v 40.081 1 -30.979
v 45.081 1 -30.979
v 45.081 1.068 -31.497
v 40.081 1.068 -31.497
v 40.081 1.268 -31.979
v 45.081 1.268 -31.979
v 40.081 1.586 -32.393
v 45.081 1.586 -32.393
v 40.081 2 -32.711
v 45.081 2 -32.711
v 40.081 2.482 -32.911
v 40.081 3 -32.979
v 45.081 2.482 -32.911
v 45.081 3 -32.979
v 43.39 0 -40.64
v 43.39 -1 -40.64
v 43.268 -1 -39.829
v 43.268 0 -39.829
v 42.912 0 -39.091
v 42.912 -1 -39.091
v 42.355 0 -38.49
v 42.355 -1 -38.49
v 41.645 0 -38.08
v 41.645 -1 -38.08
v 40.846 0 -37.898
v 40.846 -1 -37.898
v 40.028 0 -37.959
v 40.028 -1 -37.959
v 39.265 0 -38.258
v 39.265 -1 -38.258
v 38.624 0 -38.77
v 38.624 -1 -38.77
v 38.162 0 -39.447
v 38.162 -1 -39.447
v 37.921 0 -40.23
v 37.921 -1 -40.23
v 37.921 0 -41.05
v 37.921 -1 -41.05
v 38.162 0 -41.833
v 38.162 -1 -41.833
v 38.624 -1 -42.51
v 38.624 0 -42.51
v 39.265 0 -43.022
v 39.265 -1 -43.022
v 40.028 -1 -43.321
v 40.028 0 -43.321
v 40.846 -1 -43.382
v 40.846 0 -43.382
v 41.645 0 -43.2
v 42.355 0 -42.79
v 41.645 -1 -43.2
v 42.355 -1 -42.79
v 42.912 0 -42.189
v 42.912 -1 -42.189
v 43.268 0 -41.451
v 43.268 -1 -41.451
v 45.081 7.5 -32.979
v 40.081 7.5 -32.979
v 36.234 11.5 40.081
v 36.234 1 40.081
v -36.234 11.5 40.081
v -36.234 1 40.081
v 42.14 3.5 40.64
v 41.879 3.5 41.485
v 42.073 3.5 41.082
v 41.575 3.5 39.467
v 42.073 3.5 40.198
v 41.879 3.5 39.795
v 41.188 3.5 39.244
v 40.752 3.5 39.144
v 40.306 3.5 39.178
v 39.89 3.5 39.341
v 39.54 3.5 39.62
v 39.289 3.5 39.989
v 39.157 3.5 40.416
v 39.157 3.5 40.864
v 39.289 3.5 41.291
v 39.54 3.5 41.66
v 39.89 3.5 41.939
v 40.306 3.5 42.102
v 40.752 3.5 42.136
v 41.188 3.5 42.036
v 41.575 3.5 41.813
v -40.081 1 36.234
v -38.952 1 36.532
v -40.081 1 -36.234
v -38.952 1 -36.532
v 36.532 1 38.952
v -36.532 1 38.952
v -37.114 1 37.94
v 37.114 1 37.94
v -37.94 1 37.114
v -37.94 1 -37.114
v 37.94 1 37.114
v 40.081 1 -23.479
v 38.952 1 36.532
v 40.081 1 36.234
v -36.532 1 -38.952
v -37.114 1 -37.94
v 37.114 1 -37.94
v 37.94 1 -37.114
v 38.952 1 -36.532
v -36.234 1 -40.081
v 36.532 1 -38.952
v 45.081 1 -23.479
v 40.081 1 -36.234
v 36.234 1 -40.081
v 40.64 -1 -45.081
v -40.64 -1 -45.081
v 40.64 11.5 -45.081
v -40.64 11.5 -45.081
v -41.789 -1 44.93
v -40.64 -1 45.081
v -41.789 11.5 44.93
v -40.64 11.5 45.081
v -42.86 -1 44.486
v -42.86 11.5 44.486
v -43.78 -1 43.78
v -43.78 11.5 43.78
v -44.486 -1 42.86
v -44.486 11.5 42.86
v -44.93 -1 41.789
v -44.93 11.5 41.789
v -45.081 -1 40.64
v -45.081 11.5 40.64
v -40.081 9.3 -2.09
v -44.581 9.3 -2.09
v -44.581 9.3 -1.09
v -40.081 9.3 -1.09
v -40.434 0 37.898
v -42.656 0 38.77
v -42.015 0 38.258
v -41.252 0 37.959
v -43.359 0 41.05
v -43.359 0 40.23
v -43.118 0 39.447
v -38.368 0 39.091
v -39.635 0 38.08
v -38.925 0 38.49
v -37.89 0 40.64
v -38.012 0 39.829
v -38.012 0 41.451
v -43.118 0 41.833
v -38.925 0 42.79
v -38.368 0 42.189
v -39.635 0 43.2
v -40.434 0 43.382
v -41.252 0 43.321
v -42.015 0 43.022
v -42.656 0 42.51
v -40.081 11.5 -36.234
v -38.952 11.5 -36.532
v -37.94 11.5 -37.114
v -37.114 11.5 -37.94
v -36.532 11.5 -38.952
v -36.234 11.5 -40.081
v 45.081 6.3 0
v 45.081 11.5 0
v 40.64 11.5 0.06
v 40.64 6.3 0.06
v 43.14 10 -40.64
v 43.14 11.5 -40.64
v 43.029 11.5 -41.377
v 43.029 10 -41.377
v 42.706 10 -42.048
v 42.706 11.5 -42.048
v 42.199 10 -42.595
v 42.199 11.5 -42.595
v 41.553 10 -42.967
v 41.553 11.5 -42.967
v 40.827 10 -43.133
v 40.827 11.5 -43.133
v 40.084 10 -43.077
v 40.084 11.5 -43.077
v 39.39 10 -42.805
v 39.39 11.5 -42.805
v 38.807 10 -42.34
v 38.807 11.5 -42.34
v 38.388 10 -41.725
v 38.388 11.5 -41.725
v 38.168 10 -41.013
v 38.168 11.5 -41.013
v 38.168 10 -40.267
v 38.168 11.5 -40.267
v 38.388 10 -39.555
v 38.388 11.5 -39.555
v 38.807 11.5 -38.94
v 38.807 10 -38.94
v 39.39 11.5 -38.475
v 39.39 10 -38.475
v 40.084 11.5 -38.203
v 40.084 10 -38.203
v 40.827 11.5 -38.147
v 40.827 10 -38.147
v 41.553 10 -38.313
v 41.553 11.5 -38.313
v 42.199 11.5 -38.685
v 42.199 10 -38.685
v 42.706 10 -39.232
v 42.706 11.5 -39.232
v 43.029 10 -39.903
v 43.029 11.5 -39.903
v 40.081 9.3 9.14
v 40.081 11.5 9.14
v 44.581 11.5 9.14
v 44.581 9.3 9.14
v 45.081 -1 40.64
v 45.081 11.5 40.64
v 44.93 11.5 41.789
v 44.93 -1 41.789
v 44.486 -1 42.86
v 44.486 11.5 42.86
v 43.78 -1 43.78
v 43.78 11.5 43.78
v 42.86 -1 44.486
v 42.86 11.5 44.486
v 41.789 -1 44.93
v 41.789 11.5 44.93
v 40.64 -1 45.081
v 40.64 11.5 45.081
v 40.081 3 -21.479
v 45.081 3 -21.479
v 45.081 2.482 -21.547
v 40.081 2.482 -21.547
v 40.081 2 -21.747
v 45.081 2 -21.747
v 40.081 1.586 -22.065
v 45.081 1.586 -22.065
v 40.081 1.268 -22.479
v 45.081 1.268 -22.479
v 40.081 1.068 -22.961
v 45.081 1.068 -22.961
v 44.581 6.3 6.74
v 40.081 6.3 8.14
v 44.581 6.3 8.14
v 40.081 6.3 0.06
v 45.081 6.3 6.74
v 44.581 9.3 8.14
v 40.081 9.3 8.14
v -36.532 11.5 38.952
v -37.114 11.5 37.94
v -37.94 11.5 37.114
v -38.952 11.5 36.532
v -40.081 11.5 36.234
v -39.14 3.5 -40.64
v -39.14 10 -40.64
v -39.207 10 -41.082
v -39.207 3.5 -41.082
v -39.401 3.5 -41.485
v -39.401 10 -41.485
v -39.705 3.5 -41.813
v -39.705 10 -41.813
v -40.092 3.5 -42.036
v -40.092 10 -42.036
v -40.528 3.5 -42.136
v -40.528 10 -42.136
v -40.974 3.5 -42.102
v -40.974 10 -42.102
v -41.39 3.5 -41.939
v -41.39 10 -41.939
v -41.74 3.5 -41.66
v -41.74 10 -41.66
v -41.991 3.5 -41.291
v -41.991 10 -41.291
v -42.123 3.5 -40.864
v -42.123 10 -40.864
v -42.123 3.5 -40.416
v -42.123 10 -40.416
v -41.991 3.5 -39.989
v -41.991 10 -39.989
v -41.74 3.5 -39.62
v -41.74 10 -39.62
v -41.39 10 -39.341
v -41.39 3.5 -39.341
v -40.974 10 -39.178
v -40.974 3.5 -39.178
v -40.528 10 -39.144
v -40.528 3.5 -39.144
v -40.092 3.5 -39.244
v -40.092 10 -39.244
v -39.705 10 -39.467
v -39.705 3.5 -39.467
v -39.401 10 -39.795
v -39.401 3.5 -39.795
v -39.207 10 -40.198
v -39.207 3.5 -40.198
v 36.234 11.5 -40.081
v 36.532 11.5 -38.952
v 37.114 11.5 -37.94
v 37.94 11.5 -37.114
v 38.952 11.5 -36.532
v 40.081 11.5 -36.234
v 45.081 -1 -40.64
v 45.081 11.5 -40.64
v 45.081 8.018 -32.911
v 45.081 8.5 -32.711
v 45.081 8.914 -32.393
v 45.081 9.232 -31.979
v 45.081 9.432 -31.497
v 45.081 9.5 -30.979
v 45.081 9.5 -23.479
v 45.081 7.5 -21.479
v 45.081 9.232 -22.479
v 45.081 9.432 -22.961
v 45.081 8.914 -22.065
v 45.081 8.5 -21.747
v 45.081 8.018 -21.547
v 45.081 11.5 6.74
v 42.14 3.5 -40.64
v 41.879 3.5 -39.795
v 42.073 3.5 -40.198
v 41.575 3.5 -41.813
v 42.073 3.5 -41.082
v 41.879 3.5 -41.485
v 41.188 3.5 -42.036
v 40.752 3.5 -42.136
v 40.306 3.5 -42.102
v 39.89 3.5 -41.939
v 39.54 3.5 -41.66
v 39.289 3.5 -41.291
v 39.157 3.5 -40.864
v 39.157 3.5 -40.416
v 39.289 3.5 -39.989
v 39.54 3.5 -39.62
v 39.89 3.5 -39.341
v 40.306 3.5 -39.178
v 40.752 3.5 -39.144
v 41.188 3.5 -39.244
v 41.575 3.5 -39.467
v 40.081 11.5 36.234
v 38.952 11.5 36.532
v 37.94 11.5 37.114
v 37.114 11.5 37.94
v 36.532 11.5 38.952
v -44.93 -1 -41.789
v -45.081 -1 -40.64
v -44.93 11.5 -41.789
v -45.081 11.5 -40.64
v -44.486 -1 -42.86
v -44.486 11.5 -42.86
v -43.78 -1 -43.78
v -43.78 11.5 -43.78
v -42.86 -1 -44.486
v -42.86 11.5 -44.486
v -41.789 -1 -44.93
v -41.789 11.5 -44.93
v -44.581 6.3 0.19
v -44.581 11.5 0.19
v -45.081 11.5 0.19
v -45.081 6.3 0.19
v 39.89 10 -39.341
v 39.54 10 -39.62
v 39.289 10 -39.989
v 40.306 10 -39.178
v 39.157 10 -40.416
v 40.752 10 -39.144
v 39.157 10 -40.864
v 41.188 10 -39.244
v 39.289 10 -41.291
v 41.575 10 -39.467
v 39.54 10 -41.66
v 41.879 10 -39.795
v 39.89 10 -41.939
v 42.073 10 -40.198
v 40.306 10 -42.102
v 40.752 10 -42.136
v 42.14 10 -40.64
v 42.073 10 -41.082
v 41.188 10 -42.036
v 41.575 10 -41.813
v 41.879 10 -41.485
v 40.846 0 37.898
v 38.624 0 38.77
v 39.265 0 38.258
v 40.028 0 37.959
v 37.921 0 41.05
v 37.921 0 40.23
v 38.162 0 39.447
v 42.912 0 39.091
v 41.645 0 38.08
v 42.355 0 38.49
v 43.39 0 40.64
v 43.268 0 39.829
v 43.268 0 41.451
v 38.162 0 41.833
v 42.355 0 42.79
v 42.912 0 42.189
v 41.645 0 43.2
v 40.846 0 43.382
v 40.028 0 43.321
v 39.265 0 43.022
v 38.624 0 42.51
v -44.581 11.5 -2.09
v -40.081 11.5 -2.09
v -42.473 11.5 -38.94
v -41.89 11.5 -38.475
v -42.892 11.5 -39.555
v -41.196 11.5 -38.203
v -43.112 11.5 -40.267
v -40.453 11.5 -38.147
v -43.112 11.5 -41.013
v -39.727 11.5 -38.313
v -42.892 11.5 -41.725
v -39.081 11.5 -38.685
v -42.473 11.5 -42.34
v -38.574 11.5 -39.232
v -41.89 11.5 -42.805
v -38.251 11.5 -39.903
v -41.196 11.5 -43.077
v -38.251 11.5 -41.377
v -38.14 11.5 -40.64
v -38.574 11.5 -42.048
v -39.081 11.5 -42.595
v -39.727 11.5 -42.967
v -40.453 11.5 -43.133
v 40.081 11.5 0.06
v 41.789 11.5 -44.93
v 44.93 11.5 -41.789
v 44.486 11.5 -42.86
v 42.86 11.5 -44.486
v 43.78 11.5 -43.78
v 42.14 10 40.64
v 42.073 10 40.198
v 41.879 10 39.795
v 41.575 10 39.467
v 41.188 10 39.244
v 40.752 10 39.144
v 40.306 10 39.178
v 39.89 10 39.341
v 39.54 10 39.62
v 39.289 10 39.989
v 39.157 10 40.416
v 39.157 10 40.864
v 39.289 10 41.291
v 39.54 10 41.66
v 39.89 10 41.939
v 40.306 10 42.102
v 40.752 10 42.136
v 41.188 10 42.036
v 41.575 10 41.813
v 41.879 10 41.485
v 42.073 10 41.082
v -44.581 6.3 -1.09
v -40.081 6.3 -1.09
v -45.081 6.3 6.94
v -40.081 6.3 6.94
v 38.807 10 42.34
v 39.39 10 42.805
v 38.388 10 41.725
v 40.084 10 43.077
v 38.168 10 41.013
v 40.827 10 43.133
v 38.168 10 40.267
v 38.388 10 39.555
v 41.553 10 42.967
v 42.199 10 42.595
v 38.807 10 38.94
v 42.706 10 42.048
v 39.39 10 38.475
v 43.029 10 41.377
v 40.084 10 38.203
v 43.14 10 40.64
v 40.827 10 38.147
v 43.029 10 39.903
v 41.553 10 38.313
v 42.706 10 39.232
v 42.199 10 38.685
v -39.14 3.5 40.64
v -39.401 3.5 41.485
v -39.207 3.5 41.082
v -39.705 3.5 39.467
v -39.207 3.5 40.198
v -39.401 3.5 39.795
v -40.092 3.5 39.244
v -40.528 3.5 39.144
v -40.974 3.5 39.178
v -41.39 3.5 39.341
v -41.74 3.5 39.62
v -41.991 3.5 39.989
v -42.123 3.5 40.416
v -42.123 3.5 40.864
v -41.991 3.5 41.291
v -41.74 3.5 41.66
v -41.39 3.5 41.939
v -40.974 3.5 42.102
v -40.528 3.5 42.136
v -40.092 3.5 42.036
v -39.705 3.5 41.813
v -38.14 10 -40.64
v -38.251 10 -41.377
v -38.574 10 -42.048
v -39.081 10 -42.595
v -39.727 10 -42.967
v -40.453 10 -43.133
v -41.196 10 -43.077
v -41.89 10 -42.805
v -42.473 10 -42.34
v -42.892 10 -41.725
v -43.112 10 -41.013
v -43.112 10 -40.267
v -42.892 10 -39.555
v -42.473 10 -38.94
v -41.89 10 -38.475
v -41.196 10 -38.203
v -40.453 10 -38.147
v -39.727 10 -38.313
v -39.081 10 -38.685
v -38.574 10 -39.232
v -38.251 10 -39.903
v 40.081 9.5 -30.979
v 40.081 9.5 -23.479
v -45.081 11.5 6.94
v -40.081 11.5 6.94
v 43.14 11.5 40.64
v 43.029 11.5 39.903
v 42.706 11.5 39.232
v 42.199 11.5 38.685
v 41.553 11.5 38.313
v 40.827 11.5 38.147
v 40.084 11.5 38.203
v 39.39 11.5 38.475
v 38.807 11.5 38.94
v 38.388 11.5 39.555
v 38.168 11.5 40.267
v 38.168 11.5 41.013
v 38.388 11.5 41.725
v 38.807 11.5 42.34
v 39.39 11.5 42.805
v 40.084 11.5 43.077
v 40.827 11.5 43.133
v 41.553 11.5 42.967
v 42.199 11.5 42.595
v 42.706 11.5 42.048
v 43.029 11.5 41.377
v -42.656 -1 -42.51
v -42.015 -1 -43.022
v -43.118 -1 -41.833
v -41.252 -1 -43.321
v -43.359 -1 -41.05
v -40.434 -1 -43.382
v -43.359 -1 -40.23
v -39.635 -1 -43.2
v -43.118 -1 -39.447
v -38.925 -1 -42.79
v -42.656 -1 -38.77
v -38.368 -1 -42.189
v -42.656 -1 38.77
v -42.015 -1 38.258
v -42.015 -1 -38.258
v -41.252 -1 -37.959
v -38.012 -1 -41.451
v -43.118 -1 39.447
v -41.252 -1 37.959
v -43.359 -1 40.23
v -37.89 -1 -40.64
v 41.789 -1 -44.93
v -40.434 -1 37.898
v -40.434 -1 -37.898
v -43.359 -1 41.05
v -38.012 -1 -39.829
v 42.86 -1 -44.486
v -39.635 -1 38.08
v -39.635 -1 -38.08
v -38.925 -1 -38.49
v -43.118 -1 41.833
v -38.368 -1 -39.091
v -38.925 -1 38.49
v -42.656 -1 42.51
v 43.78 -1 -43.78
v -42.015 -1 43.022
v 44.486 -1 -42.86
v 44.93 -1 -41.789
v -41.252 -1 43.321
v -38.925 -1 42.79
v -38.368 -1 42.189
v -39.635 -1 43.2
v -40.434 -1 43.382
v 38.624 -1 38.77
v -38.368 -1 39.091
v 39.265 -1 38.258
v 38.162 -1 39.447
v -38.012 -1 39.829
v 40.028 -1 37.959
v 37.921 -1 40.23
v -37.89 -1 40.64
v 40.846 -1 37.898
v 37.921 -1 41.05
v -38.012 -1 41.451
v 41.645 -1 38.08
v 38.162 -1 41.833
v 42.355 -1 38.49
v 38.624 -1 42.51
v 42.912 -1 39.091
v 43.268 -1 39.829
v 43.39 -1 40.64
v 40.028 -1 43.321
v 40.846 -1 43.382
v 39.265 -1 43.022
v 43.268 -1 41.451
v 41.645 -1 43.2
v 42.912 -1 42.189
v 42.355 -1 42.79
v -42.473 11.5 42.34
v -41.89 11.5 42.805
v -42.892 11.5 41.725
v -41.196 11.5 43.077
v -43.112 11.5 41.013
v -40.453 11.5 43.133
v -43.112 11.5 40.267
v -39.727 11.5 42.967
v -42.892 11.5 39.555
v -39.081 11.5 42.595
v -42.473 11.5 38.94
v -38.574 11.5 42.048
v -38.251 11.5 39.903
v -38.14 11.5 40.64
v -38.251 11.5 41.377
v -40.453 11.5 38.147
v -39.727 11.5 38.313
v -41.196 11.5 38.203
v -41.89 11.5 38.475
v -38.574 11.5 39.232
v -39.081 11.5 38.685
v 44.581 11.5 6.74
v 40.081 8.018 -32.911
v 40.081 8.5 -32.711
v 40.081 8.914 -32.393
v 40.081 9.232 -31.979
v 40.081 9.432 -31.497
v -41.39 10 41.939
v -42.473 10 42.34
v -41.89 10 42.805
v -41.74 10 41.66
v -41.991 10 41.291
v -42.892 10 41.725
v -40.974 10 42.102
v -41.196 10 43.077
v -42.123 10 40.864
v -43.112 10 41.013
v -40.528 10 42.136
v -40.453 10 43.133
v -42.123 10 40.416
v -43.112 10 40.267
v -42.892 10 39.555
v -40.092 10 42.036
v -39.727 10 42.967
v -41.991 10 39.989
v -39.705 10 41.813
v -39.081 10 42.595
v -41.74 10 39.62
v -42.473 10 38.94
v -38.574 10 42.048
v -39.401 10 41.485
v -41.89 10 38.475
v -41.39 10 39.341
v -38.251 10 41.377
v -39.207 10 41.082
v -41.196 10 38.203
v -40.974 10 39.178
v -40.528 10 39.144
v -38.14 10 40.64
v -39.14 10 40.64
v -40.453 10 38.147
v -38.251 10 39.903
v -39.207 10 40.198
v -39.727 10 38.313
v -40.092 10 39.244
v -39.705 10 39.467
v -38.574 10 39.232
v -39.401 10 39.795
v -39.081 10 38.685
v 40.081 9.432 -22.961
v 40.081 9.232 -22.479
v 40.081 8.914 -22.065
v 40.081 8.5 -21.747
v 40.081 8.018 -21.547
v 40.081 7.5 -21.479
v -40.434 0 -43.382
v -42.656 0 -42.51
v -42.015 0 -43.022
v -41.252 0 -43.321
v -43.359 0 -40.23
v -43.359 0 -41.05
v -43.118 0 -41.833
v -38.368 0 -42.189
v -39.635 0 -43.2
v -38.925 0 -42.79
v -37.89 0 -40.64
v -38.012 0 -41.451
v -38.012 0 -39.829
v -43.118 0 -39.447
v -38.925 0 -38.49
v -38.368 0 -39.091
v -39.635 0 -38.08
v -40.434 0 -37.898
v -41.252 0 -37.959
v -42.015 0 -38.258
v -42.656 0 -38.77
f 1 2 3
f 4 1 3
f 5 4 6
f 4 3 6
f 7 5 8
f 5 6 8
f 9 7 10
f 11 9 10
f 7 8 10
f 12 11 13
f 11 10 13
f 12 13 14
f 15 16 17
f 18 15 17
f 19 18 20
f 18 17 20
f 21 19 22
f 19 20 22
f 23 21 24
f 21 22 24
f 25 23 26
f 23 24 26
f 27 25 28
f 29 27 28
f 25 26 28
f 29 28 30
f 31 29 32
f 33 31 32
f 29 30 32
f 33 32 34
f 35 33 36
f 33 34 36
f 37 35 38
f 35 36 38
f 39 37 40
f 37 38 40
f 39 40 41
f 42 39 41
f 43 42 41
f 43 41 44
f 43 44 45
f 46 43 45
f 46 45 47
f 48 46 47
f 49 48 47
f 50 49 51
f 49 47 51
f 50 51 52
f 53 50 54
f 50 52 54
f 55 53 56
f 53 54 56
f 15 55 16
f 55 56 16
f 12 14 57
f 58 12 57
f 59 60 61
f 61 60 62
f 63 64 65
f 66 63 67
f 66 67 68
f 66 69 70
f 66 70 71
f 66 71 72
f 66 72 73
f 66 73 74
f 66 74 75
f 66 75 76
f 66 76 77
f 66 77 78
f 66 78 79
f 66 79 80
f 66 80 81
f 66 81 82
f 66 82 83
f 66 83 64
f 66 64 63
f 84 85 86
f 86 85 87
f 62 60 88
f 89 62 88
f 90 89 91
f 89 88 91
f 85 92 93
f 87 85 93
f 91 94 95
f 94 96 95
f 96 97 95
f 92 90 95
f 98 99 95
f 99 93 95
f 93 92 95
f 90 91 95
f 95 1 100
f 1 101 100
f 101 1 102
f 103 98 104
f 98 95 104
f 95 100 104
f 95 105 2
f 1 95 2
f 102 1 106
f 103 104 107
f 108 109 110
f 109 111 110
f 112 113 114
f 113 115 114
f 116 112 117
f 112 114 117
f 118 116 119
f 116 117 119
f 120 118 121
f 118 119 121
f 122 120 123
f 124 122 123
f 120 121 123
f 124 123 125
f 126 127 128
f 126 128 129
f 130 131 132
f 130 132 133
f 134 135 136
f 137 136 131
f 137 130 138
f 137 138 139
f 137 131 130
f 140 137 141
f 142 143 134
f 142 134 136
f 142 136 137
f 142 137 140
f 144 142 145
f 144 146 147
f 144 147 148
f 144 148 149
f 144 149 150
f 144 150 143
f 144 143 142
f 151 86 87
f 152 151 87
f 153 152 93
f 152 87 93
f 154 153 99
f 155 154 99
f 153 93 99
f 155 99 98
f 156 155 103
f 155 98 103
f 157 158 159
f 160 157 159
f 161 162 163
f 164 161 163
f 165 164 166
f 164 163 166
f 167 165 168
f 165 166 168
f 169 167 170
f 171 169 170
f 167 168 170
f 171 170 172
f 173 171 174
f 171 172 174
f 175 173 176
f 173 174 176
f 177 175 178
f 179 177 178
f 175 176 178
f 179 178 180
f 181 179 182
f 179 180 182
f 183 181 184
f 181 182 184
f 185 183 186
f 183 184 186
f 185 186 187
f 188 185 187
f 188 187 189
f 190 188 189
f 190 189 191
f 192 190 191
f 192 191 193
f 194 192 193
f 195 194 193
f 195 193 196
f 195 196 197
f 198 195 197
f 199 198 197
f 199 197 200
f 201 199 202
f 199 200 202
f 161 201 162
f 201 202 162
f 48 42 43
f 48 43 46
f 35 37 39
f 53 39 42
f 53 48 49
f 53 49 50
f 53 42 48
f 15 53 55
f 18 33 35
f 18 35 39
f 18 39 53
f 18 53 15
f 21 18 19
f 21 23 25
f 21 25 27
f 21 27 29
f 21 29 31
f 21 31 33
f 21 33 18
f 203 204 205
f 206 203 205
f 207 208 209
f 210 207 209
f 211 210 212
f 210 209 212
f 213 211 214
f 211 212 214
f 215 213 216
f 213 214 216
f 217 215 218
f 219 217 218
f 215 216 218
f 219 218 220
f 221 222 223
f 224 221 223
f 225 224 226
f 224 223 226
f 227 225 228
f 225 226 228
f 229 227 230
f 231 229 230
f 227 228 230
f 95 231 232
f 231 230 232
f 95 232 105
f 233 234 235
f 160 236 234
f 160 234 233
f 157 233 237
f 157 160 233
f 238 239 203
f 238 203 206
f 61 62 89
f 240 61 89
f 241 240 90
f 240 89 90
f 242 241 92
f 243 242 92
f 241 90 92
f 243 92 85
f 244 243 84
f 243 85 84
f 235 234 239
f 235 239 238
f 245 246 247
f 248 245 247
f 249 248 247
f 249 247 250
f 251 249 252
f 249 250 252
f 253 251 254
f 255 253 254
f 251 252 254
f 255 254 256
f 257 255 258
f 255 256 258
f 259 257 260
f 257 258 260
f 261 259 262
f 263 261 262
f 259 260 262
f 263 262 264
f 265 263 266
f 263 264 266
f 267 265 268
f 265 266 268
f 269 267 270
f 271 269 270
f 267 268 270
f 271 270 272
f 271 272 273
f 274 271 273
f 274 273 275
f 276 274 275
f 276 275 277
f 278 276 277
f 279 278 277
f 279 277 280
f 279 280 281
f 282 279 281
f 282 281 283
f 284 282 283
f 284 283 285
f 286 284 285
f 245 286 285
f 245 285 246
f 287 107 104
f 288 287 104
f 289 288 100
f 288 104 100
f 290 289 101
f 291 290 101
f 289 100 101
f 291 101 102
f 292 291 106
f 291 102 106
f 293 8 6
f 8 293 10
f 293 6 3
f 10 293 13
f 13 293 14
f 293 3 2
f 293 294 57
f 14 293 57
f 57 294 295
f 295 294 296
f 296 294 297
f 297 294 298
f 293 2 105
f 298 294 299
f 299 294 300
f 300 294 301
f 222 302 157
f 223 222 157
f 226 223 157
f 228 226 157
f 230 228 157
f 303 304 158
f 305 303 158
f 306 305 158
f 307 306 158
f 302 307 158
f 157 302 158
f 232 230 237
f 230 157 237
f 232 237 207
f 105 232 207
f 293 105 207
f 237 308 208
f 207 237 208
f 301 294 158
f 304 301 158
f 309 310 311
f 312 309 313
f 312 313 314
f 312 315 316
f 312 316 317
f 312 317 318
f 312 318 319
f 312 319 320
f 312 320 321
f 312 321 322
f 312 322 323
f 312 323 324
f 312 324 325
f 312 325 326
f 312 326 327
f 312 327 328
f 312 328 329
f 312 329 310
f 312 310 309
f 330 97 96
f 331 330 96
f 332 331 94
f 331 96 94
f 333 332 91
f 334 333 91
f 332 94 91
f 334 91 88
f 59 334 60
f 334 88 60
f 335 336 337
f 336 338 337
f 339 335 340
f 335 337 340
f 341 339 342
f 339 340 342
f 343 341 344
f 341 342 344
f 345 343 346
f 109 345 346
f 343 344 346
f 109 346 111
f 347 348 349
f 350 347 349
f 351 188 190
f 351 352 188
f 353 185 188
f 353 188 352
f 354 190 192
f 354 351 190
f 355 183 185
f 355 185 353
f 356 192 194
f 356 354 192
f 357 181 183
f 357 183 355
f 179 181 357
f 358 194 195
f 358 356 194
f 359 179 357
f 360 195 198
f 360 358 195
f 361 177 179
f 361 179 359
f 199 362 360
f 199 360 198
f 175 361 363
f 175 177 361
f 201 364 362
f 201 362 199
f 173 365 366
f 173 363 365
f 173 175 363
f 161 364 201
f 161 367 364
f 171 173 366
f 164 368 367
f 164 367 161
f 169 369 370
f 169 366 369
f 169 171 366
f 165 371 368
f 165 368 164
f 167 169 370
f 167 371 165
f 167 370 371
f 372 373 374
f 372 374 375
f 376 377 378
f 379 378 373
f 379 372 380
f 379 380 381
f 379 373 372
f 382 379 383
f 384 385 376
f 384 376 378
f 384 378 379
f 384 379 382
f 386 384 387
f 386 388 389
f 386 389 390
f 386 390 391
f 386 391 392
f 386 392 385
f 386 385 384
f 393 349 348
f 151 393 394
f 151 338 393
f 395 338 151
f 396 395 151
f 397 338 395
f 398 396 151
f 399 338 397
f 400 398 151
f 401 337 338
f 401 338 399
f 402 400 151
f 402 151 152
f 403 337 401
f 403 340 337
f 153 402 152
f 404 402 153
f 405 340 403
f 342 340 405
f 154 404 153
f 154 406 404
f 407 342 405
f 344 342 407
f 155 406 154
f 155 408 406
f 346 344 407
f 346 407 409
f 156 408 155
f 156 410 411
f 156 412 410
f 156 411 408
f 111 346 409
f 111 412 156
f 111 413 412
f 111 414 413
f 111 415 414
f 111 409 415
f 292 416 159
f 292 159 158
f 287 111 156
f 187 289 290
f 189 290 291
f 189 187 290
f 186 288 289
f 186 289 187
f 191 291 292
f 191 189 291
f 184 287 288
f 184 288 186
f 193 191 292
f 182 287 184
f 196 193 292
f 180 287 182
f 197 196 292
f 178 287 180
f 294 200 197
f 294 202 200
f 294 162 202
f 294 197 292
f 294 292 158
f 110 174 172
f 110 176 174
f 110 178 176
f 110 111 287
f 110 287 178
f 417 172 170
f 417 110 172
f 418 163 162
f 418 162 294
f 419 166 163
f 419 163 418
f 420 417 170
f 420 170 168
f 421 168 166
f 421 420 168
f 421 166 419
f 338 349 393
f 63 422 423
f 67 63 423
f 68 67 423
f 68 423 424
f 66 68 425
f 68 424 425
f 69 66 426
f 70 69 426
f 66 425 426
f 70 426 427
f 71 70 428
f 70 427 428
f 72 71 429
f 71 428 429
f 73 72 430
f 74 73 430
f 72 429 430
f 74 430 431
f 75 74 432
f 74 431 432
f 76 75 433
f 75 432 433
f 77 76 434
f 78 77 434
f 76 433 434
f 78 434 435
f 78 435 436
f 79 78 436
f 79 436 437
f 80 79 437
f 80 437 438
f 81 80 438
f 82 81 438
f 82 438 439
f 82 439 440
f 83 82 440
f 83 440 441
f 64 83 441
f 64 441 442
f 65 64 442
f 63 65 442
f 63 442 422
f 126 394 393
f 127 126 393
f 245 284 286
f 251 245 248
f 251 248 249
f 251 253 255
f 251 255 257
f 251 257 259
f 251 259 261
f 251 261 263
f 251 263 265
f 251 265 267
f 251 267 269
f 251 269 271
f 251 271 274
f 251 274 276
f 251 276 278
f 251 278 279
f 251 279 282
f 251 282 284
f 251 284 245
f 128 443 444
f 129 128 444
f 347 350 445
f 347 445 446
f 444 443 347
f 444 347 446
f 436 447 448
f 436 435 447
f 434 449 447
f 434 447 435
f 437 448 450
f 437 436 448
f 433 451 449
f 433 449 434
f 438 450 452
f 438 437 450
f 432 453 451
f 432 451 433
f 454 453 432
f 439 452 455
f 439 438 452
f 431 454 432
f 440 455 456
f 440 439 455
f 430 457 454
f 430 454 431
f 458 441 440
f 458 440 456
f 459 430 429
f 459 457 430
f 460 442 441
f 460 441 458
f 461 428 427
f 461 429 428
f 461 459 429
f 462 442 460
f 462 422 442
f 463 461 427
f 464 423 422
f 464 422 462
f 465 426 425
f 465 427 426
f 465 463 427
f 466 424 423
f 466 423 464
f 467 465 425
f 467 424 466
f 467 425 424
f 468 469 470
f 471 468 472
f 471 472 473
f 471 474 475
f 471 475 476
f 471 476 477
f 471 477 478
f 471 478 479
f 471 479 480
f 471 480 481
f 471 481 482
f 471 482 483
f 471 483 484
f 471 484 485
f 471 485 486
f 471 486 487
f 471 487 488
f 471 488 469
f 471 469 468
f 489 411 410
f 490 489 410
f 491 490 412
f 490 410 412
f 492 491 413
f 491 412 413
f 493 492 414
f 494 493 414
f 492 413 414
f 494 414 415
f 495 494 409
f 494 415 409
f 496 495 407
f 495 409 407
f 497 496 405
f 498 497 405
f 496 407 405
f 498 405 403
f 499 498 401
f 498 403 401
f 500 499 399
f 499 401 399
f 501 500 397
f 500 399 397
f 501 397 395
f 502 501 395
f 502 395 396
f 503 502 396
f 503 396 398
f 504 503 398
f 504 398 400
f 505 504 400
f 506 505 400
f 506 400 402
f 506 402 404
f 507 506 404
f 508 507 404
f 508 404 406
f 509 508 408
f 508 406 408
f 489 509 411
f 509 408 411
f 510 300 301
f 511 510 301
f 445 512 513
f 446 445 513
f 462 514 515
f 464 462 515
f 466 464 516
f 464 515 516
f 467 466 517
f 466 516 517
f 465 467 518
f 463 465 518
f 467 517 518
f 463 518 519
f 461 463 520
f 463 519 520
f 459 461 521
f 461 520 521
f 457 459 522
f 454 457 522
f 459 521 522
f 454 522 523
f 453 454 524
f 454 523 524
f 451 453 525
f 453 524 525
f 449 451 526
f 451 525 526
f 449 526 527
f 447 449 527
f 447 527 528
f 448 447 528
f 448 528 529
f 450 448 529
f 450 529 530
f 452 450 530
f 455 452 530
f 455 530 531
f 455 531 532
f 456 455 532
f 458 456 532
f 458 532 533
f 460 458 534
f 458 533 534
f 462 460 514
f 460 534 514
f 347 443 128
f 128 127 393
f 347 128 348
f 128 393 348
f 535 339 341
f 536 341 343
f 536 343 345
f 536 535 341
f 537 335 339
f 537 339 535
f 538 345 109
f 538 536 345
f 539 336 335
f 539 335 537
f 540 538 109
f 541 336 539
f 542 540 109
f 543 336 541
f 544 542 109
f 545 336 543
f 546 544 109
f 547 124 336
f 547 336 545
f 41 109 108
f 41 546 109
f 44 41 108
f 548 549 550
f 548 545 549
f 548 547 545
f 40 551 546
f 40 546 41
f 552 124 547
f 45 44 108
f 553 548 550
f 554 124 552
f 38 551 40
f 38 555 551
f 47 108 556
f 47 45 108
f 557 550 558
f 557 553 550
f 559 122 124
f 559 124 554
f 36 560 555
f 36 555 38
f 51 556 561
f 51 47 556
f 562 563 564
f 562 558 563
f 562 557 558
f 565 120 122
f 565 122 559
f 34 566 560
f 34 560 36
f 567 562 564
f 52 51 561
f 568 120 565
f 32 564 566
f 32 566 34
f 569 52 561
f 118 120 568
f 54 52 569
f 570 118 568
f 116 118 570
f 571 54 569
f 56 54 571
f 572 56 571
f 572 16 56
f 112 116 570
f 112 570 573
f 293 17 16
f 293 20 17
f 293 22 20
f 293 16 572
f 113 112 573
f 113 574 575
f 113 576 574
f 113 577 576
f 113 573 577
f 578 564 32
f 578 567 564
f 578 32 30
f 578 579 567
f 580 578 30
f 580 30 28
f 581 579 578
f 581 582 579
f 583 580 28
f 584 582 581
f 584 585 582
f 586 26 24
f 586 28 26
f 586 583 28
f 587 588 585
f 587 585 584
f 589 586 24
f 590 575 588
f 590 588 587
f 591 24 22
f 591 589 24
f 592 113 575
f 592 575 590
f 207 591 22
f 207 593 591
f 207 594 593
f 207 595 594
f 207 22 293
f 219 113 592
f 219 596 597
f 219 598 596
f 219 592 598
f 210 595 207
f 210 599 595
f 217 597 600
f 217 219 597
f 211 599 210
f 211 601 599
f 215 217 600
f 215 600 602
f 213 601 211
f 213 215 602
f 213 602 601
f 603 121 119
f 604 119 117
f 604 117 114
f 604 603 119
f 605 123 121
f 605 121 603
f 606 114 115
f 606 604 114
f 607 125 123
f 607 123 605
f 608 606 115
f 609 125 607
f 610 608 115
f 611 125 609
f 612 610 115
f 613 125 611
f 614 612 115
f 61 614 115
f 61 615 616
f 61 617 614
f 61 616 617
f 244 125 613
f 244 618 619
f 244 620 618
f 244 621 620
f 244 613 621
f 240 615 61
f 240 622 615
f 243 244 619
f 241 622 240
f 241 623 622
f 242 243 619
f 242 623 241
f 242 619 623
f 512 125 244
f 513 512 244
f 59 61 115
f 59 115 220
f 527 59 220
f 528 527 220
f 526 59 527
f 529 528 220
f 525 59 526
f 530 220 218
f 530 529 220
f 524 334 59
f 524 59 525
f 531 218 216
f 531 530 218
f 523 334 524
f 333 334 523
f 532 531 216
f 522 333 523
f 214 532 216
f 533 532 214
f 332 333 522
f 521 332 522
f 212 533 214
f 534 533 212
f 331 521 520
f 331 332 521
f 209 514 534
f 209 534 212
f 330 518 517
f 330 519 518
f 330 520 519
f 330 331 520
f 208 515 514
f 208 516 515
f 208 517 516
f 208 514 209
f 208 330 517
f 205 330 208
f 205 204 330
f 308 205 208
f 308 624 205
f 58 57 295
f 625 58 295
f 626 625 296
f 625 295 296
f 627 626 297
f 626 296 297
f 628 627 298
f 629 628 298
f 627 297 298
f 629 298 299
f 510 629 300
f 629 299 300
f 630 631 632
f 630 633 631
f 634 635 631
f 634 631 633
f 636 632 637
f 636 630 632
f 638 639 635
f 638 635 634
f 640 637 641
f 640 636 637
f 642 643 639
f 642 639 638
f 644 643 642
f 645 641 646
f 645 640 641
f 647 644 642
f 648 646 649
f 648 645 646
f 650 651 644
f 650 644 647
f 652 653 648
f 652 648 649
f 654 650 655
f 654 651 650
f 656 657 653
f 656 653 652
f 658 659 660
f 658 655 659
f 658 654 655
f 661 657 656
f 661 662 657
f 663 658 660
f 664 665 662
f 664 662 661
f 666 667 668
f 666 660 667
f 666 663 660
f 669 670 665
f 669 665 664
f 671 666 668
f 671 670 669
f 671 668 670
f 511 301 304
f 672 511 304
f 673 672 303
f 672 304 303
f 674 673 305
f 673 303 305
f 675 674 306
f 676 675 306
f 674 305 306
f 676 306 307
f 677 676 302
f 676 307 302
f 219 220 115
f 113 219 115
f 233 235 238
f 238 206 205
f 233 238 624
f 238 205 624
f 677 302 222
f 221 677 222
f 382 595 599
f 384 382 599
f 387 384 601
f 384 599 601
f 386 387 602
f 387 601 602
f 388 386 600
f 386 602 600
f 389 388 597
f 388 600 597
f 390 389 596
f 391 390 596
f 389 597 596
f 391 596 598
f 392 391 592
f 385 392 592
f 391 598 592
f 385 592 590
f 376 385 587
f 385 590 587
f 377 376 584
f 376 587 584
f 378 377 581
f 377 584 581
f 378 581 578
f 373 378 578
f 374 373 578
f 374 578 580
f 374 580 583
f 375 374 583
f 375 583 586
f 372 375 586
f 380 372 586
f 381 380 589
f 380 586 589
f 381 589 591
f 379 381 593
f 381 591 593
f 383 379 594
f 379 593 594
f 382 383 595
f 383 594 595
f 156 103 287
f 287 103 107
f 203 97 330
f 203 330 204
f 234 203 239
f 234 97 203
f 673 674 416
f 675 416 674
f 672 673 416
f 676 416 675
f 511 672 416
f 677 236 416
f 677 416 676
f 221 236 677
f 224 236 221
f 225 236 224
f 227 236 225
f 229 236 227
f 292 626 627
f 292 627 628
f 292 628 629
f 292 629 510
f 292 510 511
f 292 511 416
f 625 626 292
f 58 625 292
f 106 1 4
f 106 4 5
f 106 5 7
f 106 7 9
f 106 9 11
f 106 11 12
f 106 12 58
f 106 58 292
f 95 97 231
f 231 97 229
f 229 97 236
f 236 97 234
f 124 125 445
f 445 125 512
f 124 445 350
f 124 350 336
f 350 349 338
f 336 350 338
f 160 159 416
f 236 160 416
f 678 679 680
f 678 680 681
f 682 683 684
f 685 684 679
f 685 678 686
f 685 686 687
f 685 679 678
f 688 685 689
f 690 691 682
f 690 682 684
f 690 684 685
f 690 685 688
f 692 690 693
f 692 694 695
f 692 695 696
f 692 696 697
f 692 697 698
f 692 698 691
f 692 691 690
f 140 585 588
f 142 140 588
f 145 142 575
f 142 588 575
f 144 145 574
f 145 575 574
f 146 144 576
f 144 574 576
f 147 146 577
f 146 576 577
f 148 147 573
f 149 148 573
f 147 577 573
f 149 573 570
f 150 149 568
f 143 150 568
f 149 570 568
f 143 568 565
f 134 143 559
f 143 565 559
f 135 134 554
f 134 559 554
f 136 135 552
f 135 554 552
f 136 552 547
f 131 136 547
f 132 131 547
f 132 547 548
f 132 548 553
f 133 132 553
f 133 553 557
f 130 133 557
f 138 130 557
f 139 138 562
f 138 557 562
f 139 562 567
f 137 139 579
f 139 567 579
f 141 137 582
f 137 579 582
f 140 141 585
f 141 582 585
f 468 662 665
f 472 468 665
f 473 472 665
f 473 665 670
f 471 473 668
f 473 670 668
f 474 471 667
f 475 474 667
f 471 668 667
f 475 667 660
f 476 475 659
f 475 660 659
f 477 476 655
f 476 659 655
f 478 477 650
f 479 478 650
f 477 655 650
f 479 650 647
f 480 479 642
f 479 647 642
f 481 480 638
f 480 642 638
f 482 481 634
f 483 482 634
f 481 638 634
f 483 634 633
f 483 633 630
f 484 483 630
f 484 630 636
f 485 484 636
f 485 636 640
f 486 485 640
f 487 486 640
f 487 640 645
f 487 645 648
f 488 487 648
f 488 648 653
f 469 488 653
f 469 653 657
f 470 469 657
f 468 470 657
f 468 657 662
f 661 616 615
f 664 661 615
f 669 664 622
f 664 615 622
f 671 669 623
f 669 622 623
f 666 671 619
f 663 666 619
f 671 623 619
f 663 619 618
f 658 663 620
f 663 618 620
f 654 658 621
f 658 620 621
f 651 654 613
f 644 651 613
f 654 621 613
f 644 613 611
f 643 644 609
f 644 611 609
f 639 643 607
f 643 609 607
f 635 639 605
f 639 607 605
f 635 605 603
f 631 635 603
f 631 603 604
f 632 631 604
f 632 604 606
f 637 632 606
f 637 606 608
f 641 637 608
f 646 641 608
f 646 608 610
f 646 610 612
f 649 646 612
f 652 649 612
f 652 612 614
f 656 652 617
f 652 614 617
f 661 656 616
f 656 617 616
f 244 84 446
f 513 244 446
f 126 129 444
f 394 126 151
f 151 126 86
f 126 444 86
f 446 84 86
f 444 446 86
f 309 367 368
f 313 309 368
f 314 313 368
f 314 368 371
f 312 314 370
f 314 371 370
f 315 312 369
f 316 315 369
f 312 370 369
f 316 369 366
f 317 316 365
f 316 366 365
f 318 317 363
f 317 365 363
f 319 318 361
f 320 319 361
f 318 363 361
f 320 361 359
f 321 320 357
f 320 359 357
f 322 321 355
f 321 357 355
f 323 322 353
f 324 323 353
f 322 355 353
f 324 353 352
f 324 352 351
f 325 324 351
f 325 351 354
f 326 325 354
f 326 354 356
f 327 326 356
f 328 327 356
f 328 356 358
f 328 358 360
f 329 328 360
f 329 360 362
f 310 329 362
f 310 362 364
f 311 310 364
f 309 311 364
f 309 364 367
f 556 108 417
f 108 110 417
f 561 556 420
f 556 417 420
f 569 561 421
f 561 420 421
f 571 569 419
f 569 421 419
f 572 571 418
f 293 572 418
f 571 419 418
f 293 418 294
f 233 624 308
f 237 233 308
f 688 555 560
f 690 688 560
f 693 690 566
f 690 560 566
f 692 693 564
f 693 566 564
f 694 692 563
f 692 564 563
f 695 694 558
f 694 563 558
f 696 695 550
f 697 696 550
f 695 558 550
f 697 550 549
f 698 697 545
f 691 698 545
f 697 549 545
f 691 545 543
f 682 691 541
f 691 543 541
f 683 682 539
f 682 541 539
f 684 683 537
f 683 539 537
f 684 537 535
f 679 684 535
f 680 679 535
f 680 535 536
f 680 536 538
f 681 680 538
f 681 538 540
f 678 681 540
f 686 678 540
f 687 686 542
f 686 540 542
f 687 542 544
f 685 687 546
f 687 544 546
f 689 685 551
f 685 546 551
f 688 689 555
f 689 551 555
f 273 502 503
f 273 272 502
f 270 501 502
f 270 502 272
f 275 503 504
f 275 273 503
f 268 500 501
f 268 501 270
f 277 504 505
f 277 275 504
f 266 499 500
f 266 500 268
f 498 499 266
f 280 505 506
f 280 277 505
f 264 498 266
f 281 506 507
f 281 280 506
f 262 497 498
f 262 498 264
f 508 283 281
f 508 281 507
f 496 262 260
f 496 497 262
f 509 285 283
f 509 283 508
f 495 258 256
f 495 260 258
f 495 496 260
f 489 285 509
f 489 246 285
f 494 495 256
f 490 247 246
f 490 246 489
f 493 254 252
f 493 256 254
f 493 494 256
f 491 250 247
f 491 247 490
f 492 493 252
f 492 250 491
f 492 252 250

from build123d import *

# Parameters (mm, degrees)
SKETCH1_W           = 7.937979337
SKETCH1_H           = 0.559115352
BOSS_EXTRUDE1_DEPTH = 11.5
SKETCH2_R           = 1.5
CUT_EXTRUDE1_DEPTH  = 8
CUT_EXTRUDE2_DEPTH  = 8
SKETCH4_R           = 2.5
CUT_EXTRUDE3_DEPTH  = 1.5
BOSS_EXTRUDE2_DEPTH = 1
BOSS_EXTRUDE3_DEPTH = 1
SKETCH7_R           = 2.75
CUT_EXTRUDE4_DEPTH  = 1
SKETCH8_W           = 0.559115352
SKETCH8_H           = 2.28
SKETCH8_H_2         = 2.4
CUT_EXTRUDE5_DEPTH  = 5.2
SKETCH9_W           = 4.5
SKETCH9_H           = 1
BOSS_EXTRUDE4_DEPTH = 3


with BuildPart() as part:
    # Sketch1 → Boss-Extrude1 (new body)
    with BuildSketch(Plane(origin=(0, 0, 0), x_dir=(1, 0, 0), z_dir=(0, 1, 0))):
        with BuildLine():
            Line((-40.080884648, -36.23445276), (-40.080884648, 18.423402639))
            Line((-40.080884648, 18.423402639), (-40.64, 18.423402639))
            Line((-40.64, 18.423402639), (-40.64, -36.199115352))
            ThreePointArc((-40.64, -36.199115352), (-40.359884529, -36.207958509), (-40.080884648, -36.23445276))
        make_face()
        with BuildLine():
            Line((-40.080884648, 18.423402639), (-40.080884648, 36.23445276))
            ThreePointArc((-40.080884648, 36.23445276), (-40.359884529, 36.207958509), (-40.64, 36.199115352))
            Line((-40.64, 36.199115352), (-40.64, 18.423402639))
            Line((-40.64, 18.423402639), (-40.080884648, 18.423402639))
        make_face()
        with BuildLine():
            Line((-36.23445276, 40.080884648), (-7.937979337, 40.080884648))
            Line((-7.937979337, 40.080884648), (-7.937979337, 40.64))
            Line((-7.937979337, 40.64), (-36.199115352, 40.64))
            ThreePointArc((-36.199115352, 40.64), (-36.207958509, 40.359884529), (-36.23445276, 40.080884648))
        make_face()
        with BuildLine():
            Line((0, 40.64), (0, 40.080884648))
            Line((0, 40.080884648), (36.23445276, 40.080884648))
            ThreePointArc((36.23445276, 40.080884648), (36.207958509, 40.359884529), (36.199115352, 40.64))
            Line((36.199115352, 40.64), (0, 40.64))
        make_face()
        with Locations((-3.968989669, 40.360442324)):
            Rectangle(SKETCH1_W, SKETCH1_H)
        with BuildLine():
            ThreePointArc((40.64, 36.199115352), (40.359884529, 36.207958509), (40.080884648, 36.23445276))
            Line((40.080884648, 36.23445276), (40.080884648, 28.268480093))
            Line((40.080884648, 28.268480093), (40.64, 28.268480093))
            Line((40.64, 28.268480093), (40.64, 36.199115352))
        make_face()
        with BuildLine():
            Line((40.64, 28.268480093), (40.080884648, 28.268480093))
            Line((40.080884648, 28.268480093), (40.080884648, -36.23445276))
            ThreePointArc((40.080884648, -36.23445276), (40.359884529, -36.207958509), (40.64, -36.199115352))
            Line((40.64, -36.199115352), (40.64, 28.268480093))
        make_face()
        with BuildLine():
            ThreePointArc((40.64, -36.199115352), (40.359884529, -36.207958509), (40.080884648, -36.23445276))
            ThreePointArc((40.080884648, -36.23445276), (37.499820351, -37.499820351), (36.23445276, -40.080884648))
            ThreePointArc((36.23445276, -40.080884648), (36.207958509, -40.359884529), (36.199115352, -40.64))
            Line((36.199115352, -40.64), (40.64, -40.64))
            Line((40.64, -40.64), (40.64, -36.199115352))
        make_face()
        with BuildLine():
            ThreePointArc((45.080884648, -40.64), (43.780179649, -37.499820351), (40.64, -36.199115352))
            Line((40.64, -36.199115352), (40.64, -40.64))
            Line((40.64, -40.64), (36.199115352, -40.64))
            ThreePointArc((36.199115352, -40.64), (37.499820351, -43.780179649), (40.64, -45.080884648))
            ThreePointArc((40.64, -45.080884648), (43.780179649, -43.780179649), (45.080884648, -40.64))
        make_face()
        with BuildLine():
            ThreePointArc((36.199115352, -40.64), (36.207958509, -40.359884529), (36.23445276, -40.080884648))
            Line((36.23445276, -40.080884648), (27.085817246, -40.080884648))
            Line((27.085817246, -40.080884648), (27.085817246, -40.64))
            Line((27.085817246, -40.64), (36.199115352, -40.64))
        make_face()
        with BuildLine():
            Line((27.085817246, -40.080884648), (-36.23445276, -40.080884648))
            ThreePointArc((-36.23445276, -40.080884648), (-36.207958509, -40.359884529), (-36.199115352, -40.64))
            Line((-36.199115352, -40.64), (27.085817246, -40.64))
            Line((27.085817246, -40.64), (27.085817246, -40.080884648))
        make_face()
        with BuildLine():
            Line((-40.64, -40.64), (-40.64, -36.199115352))
            ThreePointArc((-40.64, -36.199115352), (-43.780179649, -37.499820351), (-45.080884648, -40.64))
            ThreePointArc((-45.080884648, -40.64), (-43.780179649, -43.780179649), (-40.64, -45.080884648))
            ThreePointArc((-40.64, -45.080884648), (-37.499820351, -43.780179649), (-36.199115352, -40.64))
            Line((-36.199115352, -40.64), (-40.64, -40.64))
        make_face()
        with BuildLine():
            ThreePointArc((-36.23445276, -40.080884648), (-37.499820351, -37.499820351), (-40.080884648, -36.23445276))
            ThreePointArc((-40.080884648, -36.23445276), (-40.359884529, -36.207958509), (-40.64, -36.199115352))
            Line((-40.64, -36.199115352), (-40.64, -40.64))
            Line((-40.64, -40.64), (-36.199115352, -40.64))
            ThreePointArc((-36.199115352, -40.64), (-36.207958509, -40.359884529), (-36.23445276, -40.080884648))
        make_face()
        with BuildLine():
            Line((-40.64, -40.64), (-40.64, -36.199115352))
            ThreePointArc((-40.64, -36.199115352), (-43.780179649, -37.499820351), (-45.080884648, -40.64))
            ThreePointArc((-45.080884648, -40.64), (-43.780179649, -43.780179649), (-40.64, -45.080884648))
            ThreePointArc((-40.64, -45.080884648), (-37.499820351, -43.780179649), (-36.199115352, -40.64))
            Line((-36.199115352, -40.64), (-40.64, -40.64))
        make_face()
        with BuildLine():
            Line((27.085817246, -40.64), (-36.199115352, -40.64))
            ThreePointArc((-36.199115352, -40.64), (-37.499820351, -43.780179649), (-40.64, -45.080884648))
            Line((-40.64, -45.080884648), (27.085817246, -45.080884648))
            Line((27.085817246, -45.080884648), (27.085817246, -40.64))
        make_face()
        with BuildLine():
            Line((-40.64, -36.199115352), (-40.64, 18.423402639))
            Line((-40.64, 18.423402639), (-45.080884648, 18.423402639))
            Line((-45.080884648, 18.423402639), (-45.080884648, -40.64))
            ThreePointArc((-45.080884648, -40.64), (-43.780179649, -37.499820351), (-40.64, -36.199115352))
        make_face()
        with BuildLine():
            ThreePointArc((45.080884648, -40.64), (43.780179649, -37.499820351), (40.64, -36.199115352))
            Line((40.64, -36.199115352), (40.64, -40.64))
            Line((40.64, -40.64), (36.199115352, -40.64))
            ThreePointArc((36.199115352, -40.64), (37.499820351, -43.780179649), (40.64, -45.080884648))
            ThreePointArc((40.64, -45.080884648), (43.780179649, -43.780179649), (45.080884648, -40.64))
        make_face()
        with BuildLine():
            ThreePointArc((40.64, -45.080884648), (37.499820351, -43.780179649), (36.199115352, -40.64))
            Line((36.199115352, -40.64), (27.085817246, -40.64))
            Line((27.085817246, -40.64), (27.085817246, -45.080884648))
            Line((27.085817246, -45.080884648), (40.64, -45.080884648))
        make_face()
        with BuildLine():
            Line((45.080884648, 28.268480093), (40.64, 28.268480093))
            Line((40.64, 28.268480093), (40.64, -36.199115352))
            ThreePointArc((40.64, -36.199115352), (43.780179649, -37.499820351), (45.080884648, -40.64))
            Line((45.080884648, -40.64), (45.080884648, 28.268480093))
        make_face()
        with BuildLine():
            ThreePointArc((45.080884648, 40.64), (43.780179649, 37.499820351), (40.64, 36.199115352))
            Line((40.64, 36.199115352), (40.64, 28.268480093))
            Line((40.64, 28.268480093), (45.080884648, 28.268480093))
            Line((45.080884648, 28.268480093), (45.080884648, 40.64))
        make_face()
        with BuildLine():
            ThreePointArc((40.64, 45.080884648), (37.499820351, 43.780179649), (36.199115352, 40.64))
            Line((36.199115352, 40.64), (40.64, 40.64))
            Line((40.64, 40.64), (40.64, 36.199115352))
            ThreePointArc((40.64, 36.199115352), (43.780179649, 37.499820351), (45.080884648, 40.64))
            ThreePointArc((45.080884648, 40.64), (43.780179649, 43.780179649), (40.64, 45.080884648))
        make_face()
        with BuildLine():
            ThreePointArc((36.199115352, 40.64), (36.207958509, 40.359884529), (36.23445276, 40.080884648))
            ThreePointArc((36.23445276, 40.080884648), (37.499820351, 37.499820351), (40.080884648, 36.23445276))
            ThreePointArc((40.080884648, 36.23445276), (40.359884529, 36.207958509), (40.64, 36.199115352))
            Line((40.64, 36.199115352), (40.64, 40.64))
            Line((40.64, 40.64), (36.199115352, 40.64))
        make_face()
        with BuildLine():
            ThreePointArc((40.64, 45.080884648), (37.499820351, 43.780179649), (36.199115352, 40.64))
            Line((36.199115352, 40.64), (40.64, 40.64))
            Line((40.64, 40.64), (40.64, 36.199115352))
            ThreePointArc((40.64, 36.199115352), (43.780179649, 37.499820351), (45.080884648, 40.64))
            ThreePointArc((45.080884648, 40.64), (43.780179649, 43.780179649), (40.64, 45.080884648))
        make_face()
        with BuildLine():
            Line((-7.937979337, 40.64), (0, 40.64))
            Line((0, 40.64), (36.199115352, 40.64))
            ThreePointArc((36.199115352, 40.64), (37.499820351, 43.780179649), (40.64, 45.080884648))
            Line((40.64, 45.080884648), (-7.937979337, 45.080884648))
            Line((-7.937979337, 45.080884648), (-7.937979337, 40.64))
        make_face()
        with BuildLine():
            Line((-36.199115352, 40.64), (-7.937979337, 40.64))
            Line((-7.937979337, 40.64), (-7.937979337, 45.080884648))
            Line((-7.937979337, 45.080884648), (-40.64, 45.080884648))
            ThreePointArc((-40.64, 45.080884648), (-37.499820351, 43.780179649), (-36.199115352, 40.64))
        make_face()
        with BuildLine():
            Line((-40.64, 40.64), (-36.199115352, 40.64))
            ThreePointArc((-36.199115352, 40.64), (-37.499820351, 43.780179649), (-40.64, 45.080884648))
            ThreePointArc((-40.64, 45.080884648), (-43.780179649, 43.780179649), (-45.080884648, 40.64))
            ThreePointArc((-45.080884648, 40.64), (-43.780179649, 37.499820351), (-40.64, 36.199115352))
            Line((-40.64, 36.199115352), (-40.64, 40.64))
        make_face()
        with BuildLine():
            ThreePointArc((-40.080884648, 36.23445276), (-37.499820351, 37.499820351), (-36.23445276, 40.080884648))
            ThreePointArc((-36.23445276, 40.080884648), (-36.207958509, 40.359884529), (-36.199115352, 40.64))
            Line((-36.199115352, 40.64), (-40.64, 40.64))
            Line((-40.64, 40.64), (-40.64, 36.199115352))
            ThreePointArc((-40.64, 36.199115352), (-40.359884529, 36.207958509), (-40.080884648, 36.23445276))
        make_face()
        with BuildLine():
            Line((-40.64, 40.64), (-36.199115352, 40.64))
            ThreePointArc((-36.199115352, 40.64), (-37.499820351, 43.780179649), (-40.64, 45.080884648))
            ThreePointArc((-40.64, 45.080884648), (-43.780179649, 43.780179649), (-45.080884648, 40.64))
            ThreePointArc((-45.080884648, 40.64), (-43.780179649, 37.499820351), (-40.64, 36.199115352))
            Line((-40.64, 36.199115352), (-40.64, 40.64))
        make_face()
        with BuildLine():
            Line((-40.64, 18.423402639), (-40.64, 36.199115352))
            ThreePointArc((-40.64, 36.199115352), (-43.780179649, 37.499820351), (-45.080884648, 40.64))
            Line((-45.080884648, 40.64), (-45.080884648, 18.423402639))
            Line((-45.080884648, 18.423402639), (-40.64, 18.423402639))
        make_face()
    extrude(amount=BOSS_EXTRUDE1_DEPTH)

    # Sketch2 → Cut-Extrude1 (cut)
    with BuildSketch(Plane(origin=(0, 11.5, 0), x_dir=(1, 0, 0), z_dir=(0, 1, 0))):
        with Locations((-40.64, 40.64)):
            Circle(SKETCH2_R)
        with Locations((40.64, 40.64)):
            Circle(SKETCH2_R)
        with Locations((40.64, -40.64)):
            Circle(SKETCH2_R)
        with Locations((-40.64, -40.64)):
            Circle(SKETCH2_R)
    extrude(amount=-CUT_EXTRUDE1_DEPTH, mode=Mode.SUBTRACT)

    # Sketch3 → Cut-Extrude2 (cut)
    with BuildSketch(Plane(origin=(45.080884648, 0, 0), x_dir=(0, 0, -1), z_dir=(1, 0, 0))):
        with BuildLine():
            Line((30.979, 9.5), (23.479, 9.5))
            ThreePointArc((23.479, 9.5), (22.064786438, 8.914213562), (21.479, 7.5))
            Line((21.479, 7.5), (21.479, 3))
            ThreePointArc((21.479, 3), (22.064786438, 1.585786438), (23.479, 1))
            Line((23.479, 1), (30.979, 1))
            ThreePointArc((30.979, 1), (32.393213562, 1.585786438), (32.979, 3))
            Line((32.979, 3), (32.979, 7.5))
            ThreePointArc((32.979, 7.5), (32.393213562, 8.914213562), (30.979, 9.5))
        make_face()
    extrude(amount=-CUT_EXTRUDE2_DEPTH, mode=Mode.SUBTRACT)

    # Sketch4 → Cut-Extrude3 (cut)
    with BuildSketch(Plane(origin=(0, 11.5, 0), x_dir=(1, 0, 0), z_dir=(0, 1, 0))):
        with Locations((-40.64, 40.64)):
            Circle(SKETCH4_R)
        with Locations((40.64, 40.64)):
            Circle(SKETCH4_R)
        with Locations((40.64, -40.64)):
            Circle(SKETCH4_R)
        with Locations((-40.64, -40.64)):
            Circle(SKETCH4_R)
    extrude(amount=-CUT_EXTRUDE3_DEPTH, mode=Mode.SUBTRACT)

    # Sketch5 → Boss-Extrude2 (add)
    with BuildSketch(Plane.XZ):
        with BuildLine():
            ThreePointArc((36.23445276, 40.080884648), (37.499820351, 37.499820351), (40.080884648, 36.23445276))
            Line((40.080884648, 36.23445276), (40.080884648, -36.23445276))
            ThreePointArc((40.080884648, -36.23445276), (37.499820351, -37.499820351), (36.23445276, -40.080884648))
            Line((36.23445276, -40.080884648), (-36.23445276, -40.080884648))
            ThreePointArc((-36.23445276, -40.080884648), (-37.499820351, -37.499820351), (-40.080884648, -36.23445276))
            Line((-40.080884648, -36.23445276), (-40.080884648, 36.23445276))
            ThreePointArc((-40.080884648, 36.23445276), (-37.499820351, 37.499820351), (-36.23445276, 40.080884648))
            Line((-36.23445276, 40.080884648), (36.23445276, 40.080884648))
        make_face()
    extrude(amount=-BOSS_EXTRUDE2_DEPTH)

    # Sketch6 → Boss-Extrude3 (add)
    with BuildSketch(Plane.XZ):
        with BuildLine():
            Line((40.64, 45.080884648), (-40.64, 45.080884648))
            ThreePointArc((-40.64, 45.080884648), (-43.780179649, 43.780179649), (-45.080884648, 40.64))
            Line((-45.080884648, 40.64), (-45.080884648, -40.64))
            ThreePointArc((-45.080884648, -40.64), (-43.780179649, -43.780179649), (-40.64, -45.080884648))
            Line((-40.64, -45.080884648), (40.64, -45.080884648))
            ThreePointArc((40.64, -45.080884648), (43.780179649, -43.780179649), (45.080884648, -40.64))
            Line((45.080884648, -40.64), (45.080884648, 40.64))
            ThreePointArc((45.080884648, 40.64), (43.780179649, 43.780179649), (40.64, 45.080884648))
        make_face()
    extrude(amount=BOSS_EXTRUDE3_DEPTH)

    # Sketch7 → Cut-Extrude4 (cut)
    with BuildSketch(Plane.XZ.offset(1)):
        with Locations((-40.64, 40.64)):
            Circle(SKETCH7_R)
        with Locations((40.64, 40.64)):
            Circle(SKETCH7_R)
        with Locations((40.64, -40.64)):
            Circle(SKETCH7_R)
        with Locations((-40.64, -40.64)):
            Circle(SKETCH7_R)
    extrude(amount=-CUT_EXTRUDE4_DEPTH, mode=Mode.SUBTRACT)

    # Sketch8 → Cut-Extrude5 (cut)
    with BuildSketch(Plane(origin=(0, 11.5, 0), x_dir=(1, 0, 0), z_dir=(0, 1, 0))):
        with Locations((-40.360442324, 0.95)):
            Rectangle(SKETCH8_W, SKETCH8_H)
        Polygon((-40.080884648, -0.19), (-40.64, -0.19), (-44.580884648, -0.19), (-45.080884648, -0.19), (-45.080884648, -6.94), (-40.64, -6.94), (-40.080884648, -6.94), align=None)
        Polygon((-44.580884648, -0.19), (-40.64, -0.19), (-40.64, 2.09), (-44.380884648, 2.09), (-44.580884648, 2.09), align=None)
        Polygon((40.080884648, -6.74), (40.64, -6.74), (44.580884648, -6.74), (45.080884648, -6.74), (45.080884648, 0), (40.64, -0.06), (40.080884648, -0.06), align=None)
        with Locations((40.360442324, -7.94)):
            Rectangle(SKETCH8_W, SKETCH8_H_2)
        Polygon((40.64, -6.74), (40.64, -9.14), (44.380884648, -9.14), (44.580884648, -9.14), (44.580884648, -6.74), align=None)
    extrude(amount=-CUT_EXTRUDE5_DEPTH, mode=Mode.SUBTRACT)

    # Sketch9 → Boss-Extrude4 (add)
    with BuildSketch(Plane(origin=(0, 6.3, 0), x_dir=(1, 0, 0), z_dir=(0, 1, 0))):
        with Locations((42.330884648, -8.64)):
            Rectangle(SKETCH9_W, SKETCH9_H)
        with Locations((-42.330884648, 1.59)):
            Rectangle(SKETCH9_W, SKETCH9_H)
    extrude(amount=BOSS_EXTRUDE4_DEPTH)


solid = part.part
